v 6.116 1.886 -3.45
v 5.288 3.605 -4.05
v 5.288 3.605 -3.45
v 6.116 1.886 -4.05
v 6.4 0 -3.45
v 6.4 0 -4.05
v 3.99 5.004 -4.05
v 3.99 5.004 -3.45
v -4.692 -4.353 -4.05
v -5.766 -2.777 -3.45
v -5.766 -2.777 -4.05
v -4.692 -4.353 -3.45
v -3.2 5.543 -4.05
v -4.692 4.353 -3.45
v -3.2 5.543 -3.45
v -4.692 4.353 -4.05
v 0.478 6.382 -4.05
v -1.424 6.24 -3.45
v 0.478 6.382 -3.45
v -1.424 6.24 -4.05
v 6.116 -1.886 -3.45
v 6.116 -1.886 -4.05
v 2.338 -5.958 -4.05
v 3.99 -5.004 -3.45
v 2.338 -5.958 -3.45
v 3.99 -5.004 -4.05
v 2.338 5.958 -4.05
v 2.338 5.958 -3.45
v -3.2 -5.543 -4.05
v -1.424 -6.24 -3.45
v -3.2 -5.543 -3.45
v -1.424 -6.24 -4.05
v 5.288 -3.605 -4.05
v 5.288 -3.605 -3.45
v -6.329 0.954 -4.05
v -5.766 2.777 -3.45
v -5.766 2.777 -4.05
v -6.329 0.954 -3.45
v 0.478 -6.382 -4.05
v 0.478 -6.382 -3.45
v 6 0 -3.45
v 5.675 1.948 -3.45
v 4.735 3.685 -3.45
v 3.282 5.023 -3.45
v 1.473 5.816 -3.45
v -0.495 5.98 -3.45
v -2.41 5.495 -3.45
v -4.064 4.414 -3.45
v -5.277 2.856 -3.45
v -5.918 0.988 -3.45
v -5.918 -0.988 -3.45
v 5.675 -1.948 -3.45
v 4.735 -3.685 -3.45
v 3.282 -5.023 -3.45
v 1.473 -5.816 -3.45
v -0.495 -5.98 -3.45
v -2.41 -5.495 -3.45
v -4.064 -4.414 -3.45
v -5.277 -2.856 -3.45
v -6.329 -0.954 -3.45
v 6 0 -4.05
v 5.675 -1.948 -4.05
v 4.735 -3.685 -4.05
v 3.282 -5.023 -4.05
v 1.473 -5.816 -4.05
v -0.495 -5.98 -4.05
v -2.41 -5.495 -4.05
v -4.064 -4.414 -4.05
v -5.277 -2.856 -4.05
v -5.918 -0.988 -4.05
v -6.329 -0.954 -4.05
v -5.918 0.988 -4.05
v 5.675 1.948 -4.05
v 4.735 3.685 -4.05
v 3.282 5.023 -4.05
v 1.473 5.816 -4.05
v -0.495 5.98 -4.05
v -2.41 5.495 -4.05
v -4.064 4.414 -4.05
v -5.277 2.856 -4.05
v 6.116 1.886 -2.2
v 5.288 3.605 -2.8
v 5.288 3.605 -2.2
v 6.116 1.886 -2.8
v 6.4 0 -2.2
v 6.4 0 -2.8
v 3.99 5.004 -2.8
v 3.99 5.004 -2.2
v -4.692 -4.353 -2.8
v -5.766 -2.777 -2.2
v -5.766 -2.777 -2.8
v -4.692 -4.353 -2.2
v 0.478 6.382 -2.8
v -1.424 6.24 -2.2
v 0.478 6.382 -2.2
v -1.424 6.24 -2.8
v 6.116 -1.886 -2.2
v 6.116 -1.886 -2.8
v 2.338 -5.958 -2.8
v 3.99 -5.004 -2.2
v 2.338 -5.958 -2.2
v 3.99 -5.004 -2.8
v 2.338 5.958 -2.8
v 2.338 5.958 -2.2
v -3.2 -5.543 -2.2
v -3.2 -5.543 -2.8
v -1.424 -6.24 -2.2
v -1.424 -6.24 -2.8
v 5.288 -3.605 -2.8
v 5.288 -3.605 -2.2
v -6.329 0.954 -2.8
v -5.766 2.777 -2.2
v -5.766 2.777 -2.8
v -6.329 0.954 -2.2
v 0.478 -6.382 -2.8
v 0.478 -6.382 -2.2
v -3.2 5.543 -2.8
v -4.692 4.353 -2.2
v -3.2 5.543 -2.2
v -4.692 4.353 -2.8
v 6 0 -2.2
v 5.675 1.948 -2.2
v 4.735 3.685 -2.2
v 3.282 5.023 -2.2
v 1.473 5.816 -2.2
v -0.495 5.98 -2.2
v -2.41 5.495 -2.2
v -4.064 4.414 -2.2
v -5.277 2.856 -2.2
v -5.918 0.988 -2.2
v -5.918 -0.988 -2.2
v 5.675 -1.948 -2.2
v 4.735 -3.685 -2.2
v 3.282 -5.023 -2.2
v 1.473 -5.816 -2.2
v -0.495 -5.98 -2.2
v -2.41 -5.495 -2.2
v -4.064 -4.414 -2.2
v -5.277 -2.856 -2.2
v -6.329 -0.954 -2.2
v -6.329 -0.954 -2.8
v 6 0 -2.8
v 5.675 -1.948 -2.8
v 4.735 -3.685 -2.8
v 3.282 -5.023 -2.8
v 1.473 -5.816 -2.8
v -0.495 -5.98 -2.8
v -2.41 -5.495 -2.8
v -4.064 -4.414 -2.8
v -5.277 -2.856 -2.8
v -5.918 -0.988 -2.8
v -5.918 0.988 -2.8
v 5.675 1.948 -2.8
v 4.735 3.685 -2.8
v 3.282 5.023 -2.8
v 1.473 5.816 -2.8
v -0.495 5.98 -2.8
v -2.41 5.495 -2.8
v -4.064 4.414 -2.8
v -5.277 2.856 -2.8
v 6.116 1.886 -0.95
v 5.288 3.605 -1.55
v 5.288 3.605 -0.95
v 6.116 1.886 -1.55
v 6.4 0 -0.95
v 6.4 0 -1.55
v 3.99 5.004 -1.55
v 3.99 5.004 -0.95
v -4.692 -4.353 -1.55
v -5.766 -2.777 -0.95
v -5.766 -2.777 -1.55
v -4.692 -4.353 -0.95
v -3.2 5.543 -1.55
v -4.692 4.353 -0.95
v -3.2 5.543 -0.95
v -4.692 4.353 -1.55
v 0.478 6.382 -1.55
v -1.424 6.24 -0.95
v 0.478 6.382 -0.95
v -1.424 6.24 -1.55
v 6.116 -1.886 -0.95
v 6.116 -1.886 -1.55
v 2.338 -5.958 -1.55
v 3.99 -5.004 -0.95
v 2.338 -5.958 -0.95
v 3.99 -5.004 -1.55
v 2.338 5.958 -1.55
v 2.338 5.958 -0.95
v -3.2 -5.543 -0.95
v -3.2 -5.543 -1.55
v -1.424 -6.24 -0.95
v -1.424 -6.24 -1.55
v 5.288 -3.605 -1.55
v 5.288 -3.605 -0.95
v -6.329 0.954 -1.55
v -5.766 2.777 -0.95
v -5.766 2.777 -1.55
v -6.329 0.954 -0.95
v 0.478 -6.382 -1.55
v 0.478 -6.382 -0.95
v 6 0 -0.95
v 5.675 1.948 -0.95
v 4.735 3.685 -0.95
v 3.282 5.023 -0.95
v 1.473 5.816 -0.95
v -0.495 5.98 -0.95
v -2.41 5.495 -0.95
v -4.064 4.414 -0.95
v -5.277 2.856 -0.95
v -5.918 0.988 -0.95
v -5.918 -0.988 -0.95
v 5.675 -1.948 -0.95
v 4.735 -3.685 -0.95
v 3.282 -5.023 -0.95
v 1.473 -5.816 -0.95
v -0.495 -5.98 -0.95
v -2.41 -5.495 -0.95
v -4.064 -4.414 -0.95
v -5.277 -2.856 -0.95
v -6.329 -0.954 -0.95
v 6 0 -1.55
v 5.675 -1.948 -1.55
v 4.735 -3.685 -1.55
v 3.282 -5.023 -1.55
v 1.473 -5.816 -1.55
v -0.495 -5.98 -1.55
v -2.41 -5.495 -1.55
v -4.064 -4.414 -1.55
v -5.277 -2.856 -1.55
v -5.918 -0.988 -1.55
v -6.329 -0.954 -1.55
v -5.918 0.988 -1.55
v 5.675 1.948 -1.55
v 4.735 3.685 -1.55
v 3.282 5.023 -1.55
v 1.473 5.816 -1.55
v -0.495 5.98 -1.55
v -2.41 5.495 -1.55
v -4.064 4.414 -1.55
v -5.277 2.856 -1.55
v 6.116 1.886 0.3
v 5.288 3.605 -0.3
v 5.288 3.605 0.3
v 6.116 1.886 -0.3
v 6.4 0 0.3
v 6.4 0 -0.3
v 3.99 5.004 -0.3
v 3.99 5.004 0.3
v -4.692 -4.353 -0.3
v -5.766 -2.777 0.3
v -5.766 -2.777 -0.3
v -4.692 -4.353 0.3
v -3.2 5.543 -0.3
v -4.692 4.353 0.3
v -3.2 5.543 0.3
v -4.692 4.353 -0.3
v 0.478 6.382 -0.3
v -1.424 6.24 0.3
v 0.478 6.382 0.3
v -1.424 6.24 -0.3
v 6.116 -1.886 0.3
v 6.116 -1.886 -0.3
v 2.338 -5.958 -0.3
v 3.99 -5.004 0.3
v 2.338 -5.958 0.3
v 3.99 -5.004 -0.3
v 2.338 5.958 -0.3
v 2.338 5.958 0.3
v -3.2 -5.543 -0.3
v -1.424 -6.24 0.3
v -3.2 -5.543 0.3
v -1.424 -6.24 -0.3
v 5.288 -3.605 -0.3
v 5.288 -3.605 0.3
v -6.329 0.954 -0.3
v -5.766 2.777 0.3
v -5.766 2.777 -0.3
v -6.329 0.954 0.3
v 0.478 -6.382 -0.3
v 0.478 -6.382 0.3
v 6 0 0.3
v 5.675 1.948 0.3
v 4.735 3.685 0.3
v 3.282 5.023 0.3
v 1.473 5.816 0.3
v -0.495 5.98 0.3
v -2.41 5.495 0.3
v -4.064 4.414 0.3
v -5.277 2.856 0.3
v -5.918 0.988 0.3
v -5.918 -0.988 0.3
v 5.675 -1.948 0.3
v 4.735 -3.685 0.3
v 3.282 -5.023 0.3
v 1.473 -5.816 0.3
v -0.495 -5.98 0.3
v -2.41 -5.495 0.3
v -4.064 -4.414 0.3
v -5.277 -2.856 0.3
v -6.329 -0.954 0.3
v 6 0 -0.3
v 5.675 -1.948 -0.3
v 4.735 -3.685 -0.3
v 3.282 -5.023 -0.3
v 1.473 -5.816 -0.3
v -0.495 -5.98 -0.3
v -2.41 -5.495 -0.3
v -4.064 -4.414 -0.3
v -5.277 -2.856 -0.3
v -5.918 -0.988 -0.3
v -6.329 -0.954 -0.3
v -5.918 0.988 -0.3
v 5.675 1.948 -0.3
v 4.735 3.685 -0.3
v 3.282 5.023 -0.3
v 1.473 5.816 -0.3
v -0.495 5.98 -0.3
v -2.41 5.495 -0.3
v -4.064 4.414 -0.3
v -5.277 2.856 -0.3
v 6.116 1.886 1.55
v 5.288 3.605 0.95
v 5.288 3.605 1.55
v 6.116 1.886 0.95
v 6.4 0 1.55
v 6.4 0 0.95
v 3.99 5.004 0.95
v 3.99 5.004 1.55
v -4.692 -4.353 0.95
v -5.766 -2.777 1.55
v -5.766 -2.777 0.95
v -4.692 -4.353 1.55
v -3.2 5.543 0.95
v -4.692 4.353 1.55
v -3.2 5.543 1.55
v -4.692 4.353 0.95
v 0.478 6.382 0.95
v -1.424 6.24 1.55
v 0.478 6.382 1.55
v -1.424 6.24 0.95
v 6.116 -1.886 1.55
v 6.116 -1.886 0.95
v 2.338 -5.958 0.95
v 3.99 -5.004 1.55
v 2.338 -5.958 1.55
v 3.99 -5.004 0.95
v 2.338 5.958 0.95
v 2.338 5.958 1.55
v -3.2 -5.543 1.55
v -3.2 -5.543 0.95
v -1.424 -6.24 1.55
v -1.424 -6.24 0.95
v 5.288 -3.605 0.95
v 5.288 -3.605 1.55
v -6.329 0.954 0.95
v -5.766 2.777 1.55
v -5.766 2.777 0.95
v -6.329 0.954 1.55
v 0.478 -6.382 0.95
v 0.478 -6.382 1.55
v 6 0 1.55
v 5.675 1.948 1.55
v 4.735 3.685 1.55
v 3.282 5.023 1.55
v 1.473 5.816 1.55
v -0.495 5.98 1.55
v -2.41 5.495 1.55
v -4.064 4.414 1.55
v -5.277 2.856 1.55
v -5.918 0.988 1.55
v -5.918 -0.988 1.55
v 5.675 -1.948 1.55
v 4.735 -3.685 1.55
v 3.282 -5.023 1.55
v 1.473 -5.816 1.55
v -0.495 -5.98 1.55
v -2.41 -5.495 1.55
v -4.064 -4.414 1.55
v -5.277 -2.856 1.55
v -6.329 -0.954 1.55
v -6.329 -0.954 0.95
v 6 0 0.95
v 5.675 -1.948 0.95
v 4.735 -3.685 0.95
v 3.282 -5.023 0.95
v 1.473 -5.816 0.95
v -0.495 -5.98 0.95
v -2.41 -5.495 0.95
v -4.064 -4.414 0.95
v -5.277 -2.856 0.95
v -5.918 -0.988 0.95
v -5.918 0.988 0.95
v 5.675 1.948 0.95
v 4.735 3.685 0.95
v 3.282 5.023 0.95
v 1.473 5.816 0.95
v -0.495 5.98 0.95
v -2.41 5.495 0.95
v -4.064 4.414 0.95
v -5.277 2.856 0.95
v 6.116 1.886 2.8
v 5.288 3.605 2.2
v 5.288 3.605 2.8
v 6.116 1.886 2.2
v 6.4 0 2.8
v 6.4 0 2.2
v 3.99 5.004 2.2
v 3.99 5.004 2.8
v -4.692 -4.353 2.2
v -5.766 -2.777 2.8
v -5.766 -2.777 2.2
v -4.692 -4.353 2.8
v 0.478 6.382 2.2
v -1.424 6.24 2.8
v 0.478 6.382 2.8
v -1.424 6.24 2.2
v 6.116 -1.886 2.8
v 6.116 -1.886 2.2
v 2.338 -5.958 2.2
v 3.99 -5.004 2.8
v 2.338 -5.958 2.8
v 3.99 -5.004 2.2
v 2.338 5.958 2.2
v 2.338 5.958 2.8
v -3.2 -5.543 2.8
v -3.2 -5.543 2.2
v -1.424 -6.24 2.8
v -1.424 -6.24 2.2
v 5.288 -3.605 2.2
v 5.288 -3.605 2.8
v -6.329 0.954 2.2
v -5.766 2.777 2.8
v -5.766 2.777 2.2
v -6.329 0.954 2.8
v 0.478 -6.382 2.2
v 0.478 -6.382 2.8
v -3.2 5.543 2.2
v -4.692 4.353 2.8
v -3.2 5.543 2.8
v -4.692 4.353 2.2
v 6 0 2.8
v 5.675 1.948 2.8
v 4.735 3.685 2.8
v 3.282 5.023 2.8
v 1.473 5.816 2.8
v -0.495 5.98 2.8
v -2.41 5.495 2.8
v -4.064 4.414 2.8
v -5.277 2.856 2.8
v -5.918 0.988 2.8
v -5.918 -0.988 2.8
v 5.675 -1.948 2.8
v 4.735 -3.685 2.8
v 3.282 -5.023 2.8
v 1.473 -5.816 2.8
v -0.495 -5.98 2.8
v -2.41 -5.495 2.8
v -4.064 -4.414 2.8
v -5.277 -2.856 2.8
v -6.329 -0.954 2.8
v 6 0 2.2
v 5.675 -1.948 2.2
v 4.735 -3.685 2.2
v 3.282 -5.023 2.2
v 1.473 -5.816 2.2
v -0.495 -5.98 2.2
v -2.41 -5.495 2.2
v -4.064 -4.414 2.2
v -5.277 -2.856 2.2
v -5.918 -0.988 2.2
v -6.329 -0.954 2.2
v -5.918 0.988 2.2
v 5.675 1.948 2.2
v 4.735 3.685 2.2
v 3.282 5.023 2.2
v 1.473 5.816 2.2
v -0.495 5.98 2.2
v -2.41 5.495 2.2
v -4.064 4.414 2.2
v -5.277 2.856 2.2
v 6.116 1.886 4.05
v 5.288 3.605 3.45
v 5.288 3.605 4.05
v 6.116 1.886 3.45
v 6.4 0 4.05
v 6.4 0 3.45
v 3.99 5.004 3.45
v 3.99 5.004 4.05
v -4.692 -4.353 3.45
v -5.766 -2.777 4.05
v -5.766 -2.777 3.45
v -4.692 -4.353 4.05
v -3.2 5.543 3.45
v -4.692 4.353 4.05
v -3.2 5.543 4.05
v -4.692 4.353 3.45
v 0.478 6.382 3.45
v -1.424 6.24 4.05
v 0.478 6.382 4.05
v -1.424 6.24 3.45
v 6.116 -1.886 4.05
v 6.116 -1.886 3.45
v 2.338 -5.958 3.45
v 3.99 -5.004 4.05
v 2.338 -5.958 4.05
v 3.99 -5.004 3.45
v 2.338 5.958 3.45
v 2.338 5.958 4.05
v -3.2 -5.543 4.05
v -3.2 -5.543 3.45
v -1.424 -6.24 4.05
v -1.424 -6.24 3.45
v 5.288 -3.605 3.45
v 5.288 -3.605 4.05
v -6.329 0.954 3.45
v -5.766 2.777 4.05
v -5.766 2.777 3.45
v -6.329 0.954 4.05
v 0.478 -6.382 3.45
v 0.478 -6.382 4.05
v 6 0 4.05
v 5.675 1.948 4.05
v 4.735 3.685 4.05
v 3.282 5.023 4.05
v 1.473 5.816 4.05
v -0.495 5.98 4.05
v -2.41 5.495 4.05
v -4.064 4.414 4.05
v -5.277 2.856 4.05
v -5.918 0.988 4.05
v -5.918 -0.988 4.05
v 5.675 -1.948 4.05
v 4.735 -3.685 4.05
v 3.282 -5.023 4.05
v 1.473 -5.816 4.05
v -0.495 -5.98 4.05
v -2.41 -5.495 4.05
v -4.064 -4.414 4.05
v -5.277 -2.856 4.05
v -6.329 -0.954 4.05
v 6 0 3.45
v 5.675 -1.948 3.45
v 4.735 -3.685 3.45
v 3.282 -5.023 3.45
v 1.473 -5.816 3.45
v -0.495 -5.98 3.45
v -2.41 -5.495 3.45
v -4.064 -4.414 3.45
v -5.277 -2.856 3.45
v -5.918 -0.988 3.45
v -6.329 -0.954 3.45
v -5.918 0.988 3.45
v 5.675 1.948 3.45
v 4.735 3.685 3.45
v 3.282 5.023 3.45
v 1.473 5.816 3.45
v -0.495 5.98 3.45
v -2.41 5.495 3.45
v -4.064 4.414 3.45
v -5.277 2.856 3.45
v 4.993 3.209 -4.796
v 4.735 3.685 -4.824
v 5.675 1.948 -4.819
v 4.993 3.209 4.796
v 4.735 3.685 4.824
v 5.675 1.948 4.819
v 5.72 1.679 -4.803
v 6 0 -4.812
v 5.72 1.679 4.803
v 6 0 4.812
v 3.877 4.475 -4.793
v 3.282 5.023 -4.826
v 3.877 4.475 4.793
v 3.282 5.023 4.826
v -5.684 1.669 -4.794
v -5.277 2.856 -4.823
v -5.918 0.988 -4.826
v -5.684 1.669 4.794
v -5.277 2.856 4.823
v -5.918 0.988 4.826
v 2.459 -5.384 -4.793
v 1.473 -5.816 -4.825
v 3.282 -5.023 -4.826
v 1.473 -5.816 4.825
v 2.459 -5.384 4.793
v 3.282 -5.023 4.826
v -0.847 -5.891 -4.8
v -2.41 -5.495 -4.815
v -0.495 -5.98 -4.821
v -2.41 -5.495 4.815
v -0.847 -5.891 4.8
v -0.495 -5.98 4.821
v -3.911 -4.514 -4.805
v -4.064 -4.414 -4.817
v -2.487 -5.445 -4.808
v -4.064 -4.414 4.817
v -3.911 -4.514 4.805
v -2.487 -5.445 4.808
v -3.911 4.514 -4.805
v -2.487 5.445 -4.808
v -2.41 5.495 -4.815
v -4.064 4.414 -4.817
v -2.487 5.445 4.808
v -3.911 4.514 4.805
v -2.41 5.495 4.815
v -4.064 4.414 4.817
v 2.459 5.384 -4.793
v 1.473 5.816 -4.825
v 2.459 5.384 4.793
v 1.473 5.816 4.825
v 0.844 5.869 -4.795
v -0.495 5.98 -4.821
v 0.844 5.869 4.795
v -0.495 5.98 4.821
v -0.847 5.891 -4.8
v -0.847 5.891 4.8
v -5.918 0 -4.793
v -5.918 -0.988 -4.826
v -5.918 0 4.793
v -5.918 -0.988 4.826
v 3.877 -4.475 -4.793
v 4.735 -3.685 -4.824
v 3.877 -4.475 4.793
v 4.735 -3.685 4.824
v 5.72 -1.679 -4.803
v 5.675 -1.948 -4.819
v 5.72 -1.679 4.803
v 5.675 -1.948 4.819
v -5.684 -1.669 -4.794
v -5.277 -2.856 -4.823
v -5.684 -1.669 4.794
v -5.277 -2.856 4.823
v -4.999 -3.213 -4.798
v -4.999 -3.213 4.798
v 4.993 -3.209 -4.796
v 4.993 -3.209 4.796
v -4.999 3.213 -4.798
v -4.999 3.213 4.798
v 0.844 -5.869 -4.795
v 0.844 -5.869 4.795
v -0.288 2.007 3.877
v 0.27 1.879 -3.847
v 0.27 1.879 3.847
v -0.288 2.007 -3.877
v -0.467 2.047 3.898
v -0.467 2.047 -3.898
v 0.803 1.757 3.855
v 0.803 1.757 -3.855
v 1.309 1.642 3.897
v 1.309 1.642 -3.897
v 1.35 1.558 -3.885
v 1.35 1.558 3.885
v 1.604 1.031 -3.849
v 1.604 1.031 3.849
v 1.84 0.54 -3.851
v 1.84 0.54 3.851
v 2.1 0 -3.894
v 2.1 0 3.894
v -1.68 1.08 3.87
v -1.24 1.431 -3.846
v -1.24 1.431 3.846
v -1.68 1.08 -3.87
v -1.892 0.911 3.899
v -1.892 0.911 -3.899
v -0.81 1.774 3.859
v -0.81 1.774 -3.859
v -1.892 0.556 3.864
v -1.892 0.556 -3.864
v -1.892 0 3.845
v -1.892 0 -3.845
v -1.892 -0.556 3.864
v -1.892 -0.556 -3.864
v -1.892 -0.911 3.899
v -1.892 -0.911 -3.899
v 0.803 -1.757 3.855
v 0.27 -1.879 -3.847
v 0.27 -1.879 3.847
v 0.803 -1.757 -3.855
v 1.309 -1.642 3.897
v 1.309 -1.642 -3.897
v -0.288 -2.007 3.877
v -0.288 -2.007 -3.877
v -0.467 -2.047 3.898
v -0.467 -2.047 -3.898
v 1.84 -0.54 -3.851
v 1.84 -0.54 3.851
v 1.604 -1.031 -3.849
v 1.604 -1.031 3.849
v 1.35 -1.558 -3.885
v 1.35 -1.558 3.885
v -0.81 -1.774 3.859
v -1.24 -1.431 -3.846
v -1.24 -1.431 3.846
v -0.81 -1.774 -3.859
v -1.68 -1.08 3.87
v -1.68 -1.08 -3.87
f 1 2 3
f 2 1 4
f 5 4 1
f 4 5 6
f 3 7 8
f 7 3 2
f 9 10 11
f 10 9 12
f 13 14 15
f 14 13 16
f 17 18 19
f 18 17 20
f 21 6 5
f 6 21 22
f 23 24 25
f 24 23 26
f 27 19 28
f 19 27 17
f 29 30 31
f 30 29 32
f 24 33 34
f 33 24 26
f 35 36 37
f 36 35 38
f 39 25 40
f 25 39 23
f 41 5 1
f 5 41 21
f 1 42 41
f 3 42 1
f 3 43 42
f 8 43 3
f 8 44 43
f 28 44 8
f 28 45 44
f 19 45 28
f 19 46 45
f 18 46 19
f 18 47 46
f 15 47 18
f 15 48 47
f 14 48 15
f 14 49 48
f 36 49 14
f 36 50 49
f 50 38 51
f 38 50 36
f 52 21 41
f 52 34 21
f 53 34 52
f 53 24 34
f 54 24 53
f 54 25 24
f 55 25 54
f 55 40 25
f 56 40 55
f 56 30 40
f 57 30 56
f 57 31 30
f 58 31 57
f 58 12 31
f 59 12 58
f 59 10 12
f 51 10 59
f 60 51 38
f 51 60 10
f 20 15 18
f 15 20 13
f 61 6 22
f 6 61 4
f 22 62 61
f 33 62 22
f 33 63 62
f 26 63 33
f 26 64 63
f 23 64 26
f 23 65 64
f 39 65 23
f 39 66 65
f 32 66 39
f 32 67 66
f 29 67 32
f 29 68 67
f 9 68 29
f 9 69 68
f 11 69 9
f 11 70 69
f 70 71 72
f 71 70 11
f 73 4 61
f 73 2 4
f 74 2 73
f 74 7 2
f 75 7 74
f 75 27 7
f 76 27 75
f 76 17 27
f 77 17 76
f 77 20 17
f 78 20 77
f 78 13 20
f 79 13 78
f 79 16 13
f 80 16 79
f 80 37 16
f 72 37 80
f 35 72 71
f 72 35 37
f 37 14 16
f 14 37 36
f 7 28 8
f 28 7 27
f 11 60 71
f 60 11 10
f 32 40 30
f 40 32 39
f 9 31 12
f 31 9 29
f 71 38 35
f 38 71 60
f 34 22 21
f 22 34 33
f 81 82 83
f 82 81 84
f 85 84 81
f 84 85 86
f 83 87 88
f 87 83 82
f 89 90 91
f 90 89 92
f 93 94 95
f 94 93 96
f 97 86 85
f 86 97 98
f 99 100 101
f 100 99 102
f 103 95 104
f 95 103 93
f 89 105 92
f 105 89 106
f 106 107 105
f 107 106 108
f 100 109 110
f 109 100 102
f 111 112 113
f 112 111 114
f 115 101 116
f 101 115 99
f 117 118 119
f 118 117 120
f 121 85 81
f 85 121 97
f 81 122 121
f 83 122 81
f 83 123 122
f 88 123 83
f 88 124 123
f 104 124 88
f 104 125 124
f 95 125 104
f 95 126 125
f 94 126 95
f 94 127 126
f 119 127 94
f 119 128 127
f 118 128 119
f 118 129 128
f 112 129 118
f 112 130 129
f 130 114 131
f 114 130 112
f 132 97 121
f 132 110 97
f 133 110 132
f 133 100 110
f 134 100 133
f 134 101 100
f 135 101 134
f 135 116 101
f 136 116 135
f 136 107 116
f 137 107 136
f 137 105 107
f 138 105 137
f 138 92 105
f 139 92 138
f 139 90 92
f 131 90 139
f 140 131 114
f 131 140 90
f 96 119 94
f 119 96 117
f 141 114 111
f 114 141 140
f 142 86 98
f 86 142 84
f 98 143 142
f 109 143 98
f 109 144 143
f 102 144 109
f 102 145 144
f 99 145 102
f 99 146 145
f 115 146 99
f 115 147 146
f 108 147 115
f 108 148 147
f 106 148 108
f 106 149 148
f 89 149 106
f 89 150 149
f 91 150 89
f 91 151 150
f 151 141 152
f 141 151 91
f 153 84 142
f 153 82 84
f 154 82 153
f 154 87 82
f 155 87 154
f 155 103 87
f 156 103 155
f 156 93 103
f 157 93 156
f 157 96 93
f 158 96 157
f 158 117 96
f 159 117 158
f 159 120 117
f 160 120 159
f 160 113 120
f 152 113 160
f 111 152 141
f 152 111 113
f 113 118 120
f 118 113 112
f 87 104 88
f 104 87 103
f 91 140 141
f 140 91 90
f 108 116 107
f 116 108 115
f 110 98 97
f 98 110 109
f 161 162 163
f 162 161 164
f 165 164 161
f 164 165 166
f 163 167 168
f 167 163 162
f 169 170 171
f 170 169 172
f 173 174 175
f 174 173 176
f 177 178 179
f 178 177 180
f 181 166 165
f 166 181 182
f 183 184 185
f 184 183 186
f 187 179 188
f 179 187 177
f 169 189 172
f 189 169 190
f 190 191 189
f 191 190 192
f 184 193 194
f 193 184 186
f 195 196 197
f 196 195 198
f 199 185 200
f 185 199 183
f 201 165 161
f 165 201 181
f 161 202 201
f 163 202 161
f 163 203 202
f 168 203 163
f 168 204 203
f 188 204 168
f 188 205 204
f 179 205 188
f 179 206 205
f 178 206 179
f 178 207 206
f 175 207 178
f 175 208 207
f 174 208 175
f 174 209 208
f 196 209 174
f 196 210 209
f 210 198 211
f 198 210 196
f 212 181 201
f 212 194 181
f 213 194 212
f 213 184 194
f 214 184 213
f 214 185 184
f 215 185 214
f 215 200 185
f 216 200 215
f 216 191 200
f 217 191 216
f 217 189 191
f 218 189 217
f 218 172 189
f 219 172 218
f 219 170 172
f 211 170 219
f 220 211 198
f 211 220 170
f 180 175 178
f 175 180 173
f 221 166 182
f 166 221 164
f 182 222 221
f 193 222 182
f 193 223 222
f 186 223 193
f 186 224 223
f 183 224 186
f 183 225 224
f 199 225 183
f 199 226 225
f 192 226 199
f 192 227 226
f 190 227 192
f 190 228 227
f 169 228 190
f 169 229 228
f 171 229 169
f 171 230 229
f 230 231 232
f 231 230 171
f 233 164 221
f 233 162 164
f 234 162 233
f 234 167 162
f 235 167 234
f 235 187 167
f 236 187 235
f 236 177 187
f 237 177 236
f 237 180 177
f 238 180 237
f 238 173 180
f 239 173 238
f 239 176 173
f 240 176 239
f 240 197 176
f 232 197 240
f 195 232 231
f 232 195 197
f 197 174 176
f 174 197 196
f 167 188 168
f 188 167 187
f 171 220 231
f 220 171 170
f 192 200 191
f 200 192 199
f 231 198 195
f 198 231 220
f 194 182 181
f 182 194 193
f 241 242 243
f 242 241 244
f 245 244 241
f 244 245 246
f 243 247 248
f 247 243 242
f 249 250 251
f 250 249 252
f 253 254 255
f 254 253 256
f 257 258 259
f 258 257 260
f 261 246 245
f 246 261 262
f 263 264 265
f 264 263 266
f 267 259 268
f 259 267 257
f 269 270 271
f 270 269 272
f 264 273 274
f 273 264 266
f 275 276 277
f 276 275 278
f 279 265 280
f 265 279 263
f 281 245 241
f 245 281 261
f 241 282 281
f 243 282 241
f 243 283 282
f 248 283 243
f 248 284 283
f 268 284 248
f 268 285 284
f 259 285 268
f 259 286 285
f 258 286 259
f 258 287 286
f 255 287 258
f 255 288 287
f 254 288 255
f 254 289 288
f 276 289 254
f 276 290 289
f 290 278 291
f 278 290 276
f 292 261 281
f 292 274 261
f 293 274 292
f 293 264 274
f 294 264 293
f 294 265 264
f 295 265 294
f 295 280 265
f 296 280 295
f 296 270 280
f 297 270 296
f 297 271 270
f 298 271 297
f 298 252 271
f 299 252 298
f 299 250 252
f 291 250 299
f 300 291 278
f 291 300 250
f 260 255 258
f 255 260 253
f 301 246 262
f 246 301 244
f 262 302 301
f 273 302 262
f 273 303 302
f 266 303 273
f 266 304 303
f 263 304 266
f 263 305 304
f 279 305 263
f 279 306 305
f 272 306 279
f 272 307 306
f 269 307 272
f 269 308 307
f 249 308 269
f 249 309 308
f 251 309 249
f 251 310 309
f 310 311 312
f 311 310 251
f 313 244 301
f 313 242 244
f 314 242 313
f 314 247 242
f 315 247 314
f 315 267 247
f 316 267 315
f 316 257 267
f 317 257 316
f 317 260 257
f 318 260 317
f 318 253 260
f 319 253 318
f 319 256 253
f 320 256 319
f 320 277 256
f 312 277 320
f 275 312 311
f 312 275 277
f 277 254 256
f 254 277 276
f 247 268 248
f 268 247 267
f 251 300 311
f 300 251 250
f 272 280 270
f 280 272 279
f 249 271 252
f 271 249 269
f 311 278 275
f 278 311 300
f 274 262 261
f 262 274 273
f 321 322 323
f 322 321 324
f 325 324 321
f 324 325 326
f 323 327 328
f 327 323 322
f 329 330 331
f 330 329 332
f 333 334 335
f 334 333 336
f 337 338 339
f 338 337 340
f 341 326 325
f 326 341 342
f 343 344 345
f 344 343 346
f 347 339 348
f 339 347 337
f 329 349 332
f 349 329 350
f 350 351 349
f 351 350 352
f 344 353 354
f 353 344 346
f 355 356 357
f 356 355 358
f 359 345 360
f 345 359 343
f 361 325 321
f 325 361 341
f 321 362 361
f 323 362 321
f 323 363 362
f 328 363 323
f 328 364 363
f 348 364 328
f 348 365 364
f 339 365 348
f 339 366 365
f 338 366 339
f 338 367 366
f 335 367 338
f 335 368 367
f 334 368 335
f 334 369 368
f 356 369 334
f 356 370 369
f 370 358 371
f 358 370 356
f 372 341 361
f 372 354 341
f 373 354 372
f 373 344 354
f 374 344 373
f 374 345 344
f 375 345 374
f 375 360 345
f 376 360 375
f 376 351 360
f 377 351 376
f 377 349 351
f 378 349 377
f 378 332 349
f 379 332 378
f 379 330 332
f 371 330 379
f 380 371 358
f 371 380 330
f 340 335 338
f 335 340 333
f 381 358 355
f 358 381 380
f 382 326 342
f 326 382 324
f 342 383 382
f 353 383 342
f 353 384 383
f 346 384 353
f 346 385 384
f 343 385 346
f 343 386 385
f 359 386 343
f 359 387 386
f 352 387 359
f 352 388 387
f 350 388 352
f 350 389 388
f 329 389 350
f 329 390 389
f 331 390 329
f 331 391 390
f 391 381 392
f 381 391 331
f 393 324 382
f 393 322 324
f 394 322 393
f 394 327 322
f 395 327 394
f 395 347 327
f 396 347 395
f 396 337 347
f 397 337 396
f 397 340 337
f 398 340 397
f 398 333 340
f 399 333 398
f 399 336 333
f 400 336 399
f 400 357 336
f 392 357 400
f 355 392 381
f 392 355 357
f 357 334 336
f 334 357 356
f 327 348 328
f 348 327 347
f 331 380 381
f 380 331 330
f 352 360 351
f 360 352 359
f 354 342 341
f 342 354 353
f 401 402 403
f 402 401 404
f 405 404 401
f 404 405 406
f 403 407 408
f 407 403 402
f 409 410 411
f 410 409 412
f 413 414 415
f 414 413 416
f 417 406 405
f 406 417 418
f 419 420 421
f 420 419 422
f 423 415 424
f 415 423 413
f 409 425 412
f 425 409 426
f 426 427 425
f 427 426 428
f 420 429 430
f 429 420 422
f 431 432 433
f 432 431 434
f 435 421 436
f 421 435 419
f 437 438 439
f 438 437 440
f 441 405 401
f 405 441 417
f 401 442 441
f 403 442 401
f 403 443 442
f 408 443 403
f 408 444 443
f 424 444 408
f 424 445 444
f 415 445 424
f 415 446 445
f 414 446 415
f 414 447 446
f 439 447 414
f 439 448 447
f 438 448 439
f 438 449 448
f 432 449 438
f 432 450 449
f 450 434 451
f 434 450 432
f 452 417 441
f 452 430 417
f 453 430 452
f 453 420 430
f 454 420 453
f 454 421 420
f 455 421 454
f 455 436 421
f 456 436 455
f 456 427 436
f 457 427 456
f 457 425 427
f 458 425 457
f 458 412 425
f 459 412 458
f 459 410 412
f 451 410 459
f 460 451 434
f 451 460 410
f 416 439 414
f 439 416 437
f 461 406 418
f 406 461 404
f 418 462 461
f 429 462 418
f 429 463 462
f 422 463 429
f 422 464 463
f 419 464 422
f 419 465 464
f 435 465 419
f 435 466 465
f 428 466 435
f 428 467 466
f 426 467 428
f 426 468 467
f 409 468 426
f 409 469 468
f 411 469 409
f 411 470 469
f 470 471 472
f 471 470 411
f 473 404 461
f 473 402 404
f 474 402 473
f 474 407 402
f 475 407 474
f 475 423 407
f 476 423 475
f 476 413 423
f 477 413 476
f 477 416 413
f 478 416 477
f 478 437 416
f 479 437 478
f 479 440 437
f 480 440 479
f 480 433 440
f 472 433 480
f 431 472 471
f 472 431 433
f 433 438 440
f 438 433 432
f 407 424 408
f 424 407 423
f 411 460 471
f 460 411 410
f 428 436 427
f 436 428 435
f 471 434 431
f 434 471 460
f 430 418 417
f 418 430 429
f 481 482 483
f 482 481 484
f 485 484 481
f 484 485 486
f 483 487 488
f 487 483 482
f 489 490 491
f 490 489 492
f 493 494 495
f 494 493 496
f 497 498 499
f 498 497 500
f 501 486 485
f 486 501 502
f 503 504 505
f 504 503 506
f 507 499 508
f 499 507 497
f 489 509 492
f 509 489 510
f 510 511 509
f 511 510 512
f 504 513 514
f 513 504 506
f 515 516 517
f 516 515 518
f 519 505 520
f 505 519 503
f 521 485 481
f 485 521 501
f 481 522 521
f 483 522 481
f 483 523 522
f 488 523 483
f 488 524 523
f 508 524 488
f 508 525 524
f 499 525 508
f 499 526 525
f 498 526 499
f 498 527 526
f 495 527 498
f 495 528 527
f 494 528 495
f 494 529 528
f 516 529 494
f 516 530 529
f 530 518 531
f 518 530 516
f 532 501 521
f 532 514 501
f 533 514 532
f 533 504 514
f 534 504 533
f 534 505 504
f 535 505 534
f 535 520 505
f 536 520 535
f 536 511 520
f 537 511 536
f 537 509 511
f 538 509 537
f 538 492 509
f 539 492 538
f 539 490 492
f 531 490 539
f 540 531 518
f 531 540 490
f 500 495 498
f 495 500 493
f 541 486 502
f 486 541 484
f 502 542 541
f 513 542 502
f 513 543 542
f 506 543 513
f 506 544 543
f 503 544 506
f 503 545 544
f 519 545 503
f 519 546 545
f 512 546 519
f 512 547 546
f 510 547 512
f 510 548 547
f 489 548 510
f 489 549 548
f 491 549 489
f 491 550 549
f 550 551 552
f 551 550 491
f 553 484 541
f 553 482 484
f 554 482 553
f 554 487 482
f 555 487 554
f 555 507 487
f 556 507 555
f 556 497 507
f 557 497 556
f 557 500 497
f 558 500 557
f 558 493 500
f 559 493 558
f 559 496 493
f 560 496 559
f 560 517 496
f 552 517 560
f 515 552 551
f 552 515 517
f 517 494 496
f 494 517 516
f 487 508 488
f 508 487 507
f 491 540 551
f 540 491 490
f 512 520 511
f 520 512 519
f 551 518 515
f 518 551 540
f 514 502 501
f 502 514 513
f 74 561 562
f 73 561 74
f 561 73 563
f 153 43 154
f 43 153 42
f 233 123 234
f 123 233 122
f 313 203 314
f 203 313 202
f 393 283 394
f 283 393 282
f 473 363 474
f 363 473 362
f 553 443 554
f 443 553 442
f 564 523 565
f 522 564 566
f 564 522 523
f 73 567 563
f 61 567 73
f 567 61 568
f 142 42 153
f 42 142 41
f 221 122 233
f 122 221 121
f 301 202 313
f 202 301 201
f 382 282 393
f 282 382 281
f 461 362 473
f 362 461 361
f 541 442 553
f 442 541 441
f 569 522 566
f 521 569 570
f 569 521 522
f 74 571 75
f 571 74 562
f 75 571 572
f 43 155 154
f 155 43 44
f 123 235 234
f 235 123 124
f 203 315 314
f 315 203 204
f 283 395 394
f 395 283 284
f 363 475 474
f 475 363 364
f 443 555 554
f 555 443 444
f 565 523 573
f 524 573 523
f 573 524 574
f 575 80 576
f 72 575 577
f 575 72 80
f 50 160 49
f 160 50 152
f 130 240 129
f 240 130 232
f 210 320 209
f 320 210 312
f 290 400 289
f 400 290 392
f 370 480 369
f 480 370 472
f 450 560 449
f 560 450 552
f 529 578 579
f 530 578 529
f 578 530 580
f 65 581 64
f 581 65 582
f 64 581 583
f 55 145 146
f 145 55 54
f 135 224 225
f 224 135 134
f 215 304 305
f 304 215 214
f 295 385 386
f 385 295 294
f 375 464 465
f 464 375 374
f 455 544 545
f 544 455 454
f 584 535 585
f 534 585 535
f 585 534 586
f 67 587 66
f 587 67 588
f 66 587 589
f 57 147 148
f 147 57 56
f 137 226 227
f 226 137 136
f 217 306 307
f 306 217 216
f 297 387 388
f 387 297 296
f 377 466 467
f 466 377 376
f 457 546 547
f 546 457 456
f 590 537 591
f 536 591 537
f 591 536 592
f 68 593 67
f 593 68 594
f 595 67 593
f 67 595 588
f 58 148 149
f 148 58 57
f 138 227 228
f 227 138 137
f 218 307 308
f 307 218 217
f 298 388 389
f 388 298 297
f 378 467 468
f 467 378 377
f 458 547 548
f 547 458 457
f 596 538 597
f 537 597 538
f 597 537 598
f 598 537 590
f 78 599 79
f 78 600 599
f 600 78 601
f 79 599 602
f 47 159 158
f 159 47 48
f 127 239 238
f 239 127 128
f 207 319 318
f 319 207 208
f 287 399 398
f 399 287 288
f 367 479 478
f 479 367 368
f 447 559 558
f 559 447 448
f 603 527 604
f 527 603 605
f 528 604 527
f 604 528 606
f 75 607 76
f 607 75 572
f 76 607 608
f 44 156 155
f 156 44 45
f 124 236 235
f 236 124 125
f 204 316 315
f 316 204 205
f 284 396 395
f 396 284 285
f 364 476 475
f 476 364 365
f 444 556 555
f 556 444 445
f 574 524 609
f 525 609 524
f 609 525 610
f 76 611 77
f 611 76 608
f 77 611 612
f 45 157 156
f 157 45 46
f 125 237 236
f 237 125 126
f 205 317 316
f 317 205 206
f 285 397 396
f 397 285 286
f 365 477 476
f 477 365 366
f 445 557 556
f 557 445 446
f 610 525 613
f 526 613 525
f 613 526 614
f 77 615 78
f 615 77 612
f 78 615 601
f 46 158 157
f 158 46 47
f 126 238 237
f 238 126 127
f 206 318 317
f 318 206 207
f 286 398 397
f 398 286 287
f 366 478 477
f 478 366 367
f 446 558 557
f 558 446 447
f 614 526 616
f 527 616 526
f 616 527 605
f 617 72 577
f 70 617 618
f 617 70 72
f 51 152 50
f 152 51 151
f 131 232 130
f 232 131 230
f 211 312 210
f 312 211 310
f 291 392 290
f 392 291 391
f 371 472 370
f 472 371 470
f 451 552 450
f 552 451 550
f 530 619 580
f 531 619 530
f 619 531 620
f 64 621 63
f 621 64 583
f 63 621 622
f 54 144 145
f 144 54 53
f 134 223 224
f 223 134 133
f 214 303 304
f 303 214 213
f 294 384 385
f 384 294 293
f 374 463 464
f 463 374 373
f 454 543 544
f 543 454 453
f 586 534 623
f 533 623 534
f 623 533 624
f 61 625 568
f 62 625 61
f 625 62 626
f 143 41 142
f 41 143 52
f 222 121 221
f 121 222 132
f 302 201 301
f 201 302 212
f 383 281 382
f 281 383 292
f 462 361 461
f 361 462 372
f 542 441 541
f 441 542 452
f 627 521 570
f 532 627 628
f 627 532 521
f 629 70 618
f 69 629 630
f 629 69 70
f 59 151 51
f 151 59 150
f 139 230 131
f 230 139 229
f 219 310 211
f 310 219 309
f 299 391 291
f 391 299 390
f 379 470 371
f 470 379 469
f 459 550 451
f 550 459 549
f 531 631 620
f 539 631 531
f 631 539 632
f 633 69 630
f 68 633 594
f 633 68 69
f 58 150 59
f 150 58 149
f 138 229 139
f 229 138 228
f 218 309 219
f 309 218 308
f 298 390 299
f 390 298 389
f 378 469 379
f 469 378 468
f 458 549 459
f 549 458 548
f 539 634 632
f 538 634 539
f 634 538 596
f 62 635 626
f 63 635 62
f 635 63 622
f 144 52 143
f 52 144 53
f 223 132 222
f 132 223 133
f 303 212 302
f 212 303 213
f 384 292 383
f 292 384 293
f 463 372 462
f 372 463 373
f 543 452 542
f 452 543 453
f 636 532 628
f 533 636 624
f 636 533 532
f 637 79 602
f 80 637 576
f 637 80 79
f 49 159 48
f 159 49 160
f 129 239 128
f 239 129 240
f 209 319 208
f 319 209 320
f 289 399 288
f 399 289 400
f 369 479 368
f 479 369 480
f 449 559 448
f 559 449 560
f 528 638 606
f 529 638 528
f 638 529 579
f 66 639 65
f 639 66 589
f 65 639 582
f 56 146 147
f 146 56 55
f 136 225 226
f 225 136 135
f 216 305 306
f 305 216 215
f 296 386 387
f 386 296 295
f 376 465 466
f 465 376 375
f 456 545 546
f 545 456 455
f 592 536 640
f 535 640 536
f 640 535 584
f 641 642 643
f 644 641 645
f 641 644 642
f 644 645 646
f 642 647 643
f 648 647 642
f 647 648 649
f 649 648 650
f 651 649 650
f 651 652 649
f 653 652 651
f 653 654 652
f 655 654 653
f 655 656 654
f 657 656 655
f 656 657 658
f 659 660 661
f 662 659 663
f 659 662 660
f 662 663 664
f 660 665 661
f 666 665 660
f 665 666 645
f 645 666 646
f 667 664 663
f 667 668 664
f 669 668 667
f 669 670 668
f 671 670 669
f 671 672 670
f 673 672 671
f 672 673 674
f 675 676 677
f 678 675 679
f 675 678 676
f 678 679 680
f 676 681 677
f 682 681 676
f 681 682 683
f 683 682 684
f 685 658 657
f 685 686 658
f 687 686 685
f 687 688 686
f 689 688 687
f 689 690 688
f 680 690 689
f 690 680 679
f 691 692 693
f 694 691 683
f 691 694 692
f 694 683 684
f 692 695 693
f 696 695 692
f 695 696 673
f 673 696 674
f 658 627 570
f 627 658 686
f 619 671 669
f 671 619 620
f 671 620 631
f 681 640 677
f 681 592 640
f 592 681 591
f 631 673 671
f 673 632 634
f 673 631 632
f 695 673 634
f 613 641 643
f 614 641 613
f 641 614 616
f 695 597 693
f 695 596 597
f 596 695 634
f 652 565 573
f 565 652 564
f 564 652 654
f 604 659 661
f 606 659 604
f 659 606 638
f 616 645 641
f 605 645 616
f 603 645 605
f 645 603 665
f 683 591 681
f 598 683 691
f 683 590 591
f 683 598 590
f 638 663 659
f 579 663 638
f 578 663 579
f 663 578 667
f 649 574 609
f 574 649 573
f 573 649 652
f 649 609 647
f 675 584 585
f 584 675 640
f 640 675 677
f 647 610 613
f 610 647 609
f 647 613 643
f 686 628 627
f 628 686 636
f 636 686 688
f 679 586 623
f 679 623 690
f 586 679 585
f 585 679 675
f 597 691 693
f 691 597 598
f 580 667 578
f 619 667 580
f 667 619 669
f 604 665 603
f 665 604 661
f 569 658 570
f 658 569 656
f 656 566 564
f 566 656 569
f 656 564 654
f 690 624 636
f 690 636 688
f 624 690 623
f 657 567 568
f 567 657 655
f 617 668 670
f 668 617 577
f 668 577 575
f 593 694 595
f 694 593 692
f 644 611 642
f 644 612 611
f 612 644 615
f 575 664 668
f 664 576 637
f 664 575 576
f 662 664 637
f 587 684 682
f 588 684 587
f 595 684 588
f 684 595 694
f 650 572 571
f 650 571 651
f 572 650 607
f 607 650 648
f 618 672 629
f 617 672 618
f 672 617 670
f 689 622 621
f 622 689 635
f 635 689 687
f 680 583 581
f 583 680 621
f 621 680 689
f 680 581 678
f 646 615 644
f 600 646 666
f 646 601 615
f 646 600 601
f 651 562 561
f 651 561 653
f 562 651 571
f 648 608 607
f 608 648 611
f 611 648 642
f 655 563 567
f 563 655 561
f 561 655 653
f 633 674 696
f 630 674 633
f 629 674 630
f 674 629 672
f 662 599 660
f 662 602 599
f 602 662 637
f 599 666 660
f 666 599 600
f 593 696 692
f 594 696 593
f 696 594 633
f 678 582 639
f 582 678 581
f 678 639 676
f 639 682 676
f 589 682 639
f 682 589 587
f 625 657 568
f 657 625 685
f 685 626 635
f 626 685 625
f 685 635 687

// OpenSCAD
// Parameters
outer_diameter_mm = 12; //[6:24:0.1]
length_mm = 10; //[5:20:0.1]
screw_diameter_mm = 5; //[2.5:10:0.1]
internal_thread_pitch_mm = 0.8; //[0.4:1.6:0.05]
internal_minor_diameter_mm = 4.2; //[3:6:0.05]
internal_thread_depth_mm = 10; //[5:20:0.1]
top_chamfer_height_mm = 0.8; //[0.2:2:0.05]
top_chamfer_angle_deg = 45; //[20:70:1]
bottom_chamfer_height_mm = 0.8; //[0.2:2:0.05]
bottom_chamfer_angle_deg = 45; //[20:70:1]
external_knurl_depth_mm = 0.4; //[0.1:1:0.05]
external_knurl_pitch_mm = 1; //[0.5:2.5:0.1]
knurl_ring_thickness_mm = 0.6; //[0.3:1.5:0.05]
knurl_ring_count = 7; //[3:20:1]
has_top_flange = 0; //[0:1:1]
top_flange_diameter_mm = 12; //[6:26:0.1]
top_flange_thickness_mm = 0; //[0:3:0.1]
overlap_mm = 0.8; //[0.2:2:0.1]

// Threaded Insert - complete geometry
module threaded_insert() {
  color([0.8, 0.6, 0.2]) { // Brass color
    difference() {
      union() {
        // Insert body with knurl rings
        union() {
          cylinder(r=outer_diameter_mm/2, h=length_mm, center=true);
          for (i = [1:knurl_ring_count]) {
            translate([0, 0, -length_mm/2 + (length_mm/(knurl_ring_count+1))*i])
              cylinder(r=outer_diameter_mm/2 + external_knurl_depth_mm, h=knurl_ring_thickness_mm, center=true);
          }
        }
        // Optional top flange
        if (has_top_flange) {
          translate([0, 0, length_mm/2 + top_flange_thickness_mm/2 - overlap_mm])
            cylinder(r=top_flange_diameter_mm/2, h=top_flange_thickness_mm, center=true);
        }
      }
      // Internal thread bore
      cylinder(r=internal_minor_diameter_mm/2, h=internal_thread_depth_mm + 2*overlap_mm, center=true);
      // Top chamfer
      translate([0, 0, length_mm/2 - (top_chamfer_height_mm + overlap_mm)/2])
        rotate([180, 0, 0])
        cylinder(r1=outer_diameter_mm/2 + overlap_mm, r2=0, h=top_chamfer_height_mm + overlap_mm, center=true);
      // Bottom chamfer
      translate([0, 0, -length_mm/2 + (bottom_chamfer_height_mm + overlap_mm)/2])
        cylinder(r1=outer_diameter_mm/2 + overlap_mm, r2=0, h=bottom_chamfer_height_mm + overlap_mm, center=true);
    }
  }
}

// Assembly
module assembly() {
  threaded_insert();
}

assembly();
